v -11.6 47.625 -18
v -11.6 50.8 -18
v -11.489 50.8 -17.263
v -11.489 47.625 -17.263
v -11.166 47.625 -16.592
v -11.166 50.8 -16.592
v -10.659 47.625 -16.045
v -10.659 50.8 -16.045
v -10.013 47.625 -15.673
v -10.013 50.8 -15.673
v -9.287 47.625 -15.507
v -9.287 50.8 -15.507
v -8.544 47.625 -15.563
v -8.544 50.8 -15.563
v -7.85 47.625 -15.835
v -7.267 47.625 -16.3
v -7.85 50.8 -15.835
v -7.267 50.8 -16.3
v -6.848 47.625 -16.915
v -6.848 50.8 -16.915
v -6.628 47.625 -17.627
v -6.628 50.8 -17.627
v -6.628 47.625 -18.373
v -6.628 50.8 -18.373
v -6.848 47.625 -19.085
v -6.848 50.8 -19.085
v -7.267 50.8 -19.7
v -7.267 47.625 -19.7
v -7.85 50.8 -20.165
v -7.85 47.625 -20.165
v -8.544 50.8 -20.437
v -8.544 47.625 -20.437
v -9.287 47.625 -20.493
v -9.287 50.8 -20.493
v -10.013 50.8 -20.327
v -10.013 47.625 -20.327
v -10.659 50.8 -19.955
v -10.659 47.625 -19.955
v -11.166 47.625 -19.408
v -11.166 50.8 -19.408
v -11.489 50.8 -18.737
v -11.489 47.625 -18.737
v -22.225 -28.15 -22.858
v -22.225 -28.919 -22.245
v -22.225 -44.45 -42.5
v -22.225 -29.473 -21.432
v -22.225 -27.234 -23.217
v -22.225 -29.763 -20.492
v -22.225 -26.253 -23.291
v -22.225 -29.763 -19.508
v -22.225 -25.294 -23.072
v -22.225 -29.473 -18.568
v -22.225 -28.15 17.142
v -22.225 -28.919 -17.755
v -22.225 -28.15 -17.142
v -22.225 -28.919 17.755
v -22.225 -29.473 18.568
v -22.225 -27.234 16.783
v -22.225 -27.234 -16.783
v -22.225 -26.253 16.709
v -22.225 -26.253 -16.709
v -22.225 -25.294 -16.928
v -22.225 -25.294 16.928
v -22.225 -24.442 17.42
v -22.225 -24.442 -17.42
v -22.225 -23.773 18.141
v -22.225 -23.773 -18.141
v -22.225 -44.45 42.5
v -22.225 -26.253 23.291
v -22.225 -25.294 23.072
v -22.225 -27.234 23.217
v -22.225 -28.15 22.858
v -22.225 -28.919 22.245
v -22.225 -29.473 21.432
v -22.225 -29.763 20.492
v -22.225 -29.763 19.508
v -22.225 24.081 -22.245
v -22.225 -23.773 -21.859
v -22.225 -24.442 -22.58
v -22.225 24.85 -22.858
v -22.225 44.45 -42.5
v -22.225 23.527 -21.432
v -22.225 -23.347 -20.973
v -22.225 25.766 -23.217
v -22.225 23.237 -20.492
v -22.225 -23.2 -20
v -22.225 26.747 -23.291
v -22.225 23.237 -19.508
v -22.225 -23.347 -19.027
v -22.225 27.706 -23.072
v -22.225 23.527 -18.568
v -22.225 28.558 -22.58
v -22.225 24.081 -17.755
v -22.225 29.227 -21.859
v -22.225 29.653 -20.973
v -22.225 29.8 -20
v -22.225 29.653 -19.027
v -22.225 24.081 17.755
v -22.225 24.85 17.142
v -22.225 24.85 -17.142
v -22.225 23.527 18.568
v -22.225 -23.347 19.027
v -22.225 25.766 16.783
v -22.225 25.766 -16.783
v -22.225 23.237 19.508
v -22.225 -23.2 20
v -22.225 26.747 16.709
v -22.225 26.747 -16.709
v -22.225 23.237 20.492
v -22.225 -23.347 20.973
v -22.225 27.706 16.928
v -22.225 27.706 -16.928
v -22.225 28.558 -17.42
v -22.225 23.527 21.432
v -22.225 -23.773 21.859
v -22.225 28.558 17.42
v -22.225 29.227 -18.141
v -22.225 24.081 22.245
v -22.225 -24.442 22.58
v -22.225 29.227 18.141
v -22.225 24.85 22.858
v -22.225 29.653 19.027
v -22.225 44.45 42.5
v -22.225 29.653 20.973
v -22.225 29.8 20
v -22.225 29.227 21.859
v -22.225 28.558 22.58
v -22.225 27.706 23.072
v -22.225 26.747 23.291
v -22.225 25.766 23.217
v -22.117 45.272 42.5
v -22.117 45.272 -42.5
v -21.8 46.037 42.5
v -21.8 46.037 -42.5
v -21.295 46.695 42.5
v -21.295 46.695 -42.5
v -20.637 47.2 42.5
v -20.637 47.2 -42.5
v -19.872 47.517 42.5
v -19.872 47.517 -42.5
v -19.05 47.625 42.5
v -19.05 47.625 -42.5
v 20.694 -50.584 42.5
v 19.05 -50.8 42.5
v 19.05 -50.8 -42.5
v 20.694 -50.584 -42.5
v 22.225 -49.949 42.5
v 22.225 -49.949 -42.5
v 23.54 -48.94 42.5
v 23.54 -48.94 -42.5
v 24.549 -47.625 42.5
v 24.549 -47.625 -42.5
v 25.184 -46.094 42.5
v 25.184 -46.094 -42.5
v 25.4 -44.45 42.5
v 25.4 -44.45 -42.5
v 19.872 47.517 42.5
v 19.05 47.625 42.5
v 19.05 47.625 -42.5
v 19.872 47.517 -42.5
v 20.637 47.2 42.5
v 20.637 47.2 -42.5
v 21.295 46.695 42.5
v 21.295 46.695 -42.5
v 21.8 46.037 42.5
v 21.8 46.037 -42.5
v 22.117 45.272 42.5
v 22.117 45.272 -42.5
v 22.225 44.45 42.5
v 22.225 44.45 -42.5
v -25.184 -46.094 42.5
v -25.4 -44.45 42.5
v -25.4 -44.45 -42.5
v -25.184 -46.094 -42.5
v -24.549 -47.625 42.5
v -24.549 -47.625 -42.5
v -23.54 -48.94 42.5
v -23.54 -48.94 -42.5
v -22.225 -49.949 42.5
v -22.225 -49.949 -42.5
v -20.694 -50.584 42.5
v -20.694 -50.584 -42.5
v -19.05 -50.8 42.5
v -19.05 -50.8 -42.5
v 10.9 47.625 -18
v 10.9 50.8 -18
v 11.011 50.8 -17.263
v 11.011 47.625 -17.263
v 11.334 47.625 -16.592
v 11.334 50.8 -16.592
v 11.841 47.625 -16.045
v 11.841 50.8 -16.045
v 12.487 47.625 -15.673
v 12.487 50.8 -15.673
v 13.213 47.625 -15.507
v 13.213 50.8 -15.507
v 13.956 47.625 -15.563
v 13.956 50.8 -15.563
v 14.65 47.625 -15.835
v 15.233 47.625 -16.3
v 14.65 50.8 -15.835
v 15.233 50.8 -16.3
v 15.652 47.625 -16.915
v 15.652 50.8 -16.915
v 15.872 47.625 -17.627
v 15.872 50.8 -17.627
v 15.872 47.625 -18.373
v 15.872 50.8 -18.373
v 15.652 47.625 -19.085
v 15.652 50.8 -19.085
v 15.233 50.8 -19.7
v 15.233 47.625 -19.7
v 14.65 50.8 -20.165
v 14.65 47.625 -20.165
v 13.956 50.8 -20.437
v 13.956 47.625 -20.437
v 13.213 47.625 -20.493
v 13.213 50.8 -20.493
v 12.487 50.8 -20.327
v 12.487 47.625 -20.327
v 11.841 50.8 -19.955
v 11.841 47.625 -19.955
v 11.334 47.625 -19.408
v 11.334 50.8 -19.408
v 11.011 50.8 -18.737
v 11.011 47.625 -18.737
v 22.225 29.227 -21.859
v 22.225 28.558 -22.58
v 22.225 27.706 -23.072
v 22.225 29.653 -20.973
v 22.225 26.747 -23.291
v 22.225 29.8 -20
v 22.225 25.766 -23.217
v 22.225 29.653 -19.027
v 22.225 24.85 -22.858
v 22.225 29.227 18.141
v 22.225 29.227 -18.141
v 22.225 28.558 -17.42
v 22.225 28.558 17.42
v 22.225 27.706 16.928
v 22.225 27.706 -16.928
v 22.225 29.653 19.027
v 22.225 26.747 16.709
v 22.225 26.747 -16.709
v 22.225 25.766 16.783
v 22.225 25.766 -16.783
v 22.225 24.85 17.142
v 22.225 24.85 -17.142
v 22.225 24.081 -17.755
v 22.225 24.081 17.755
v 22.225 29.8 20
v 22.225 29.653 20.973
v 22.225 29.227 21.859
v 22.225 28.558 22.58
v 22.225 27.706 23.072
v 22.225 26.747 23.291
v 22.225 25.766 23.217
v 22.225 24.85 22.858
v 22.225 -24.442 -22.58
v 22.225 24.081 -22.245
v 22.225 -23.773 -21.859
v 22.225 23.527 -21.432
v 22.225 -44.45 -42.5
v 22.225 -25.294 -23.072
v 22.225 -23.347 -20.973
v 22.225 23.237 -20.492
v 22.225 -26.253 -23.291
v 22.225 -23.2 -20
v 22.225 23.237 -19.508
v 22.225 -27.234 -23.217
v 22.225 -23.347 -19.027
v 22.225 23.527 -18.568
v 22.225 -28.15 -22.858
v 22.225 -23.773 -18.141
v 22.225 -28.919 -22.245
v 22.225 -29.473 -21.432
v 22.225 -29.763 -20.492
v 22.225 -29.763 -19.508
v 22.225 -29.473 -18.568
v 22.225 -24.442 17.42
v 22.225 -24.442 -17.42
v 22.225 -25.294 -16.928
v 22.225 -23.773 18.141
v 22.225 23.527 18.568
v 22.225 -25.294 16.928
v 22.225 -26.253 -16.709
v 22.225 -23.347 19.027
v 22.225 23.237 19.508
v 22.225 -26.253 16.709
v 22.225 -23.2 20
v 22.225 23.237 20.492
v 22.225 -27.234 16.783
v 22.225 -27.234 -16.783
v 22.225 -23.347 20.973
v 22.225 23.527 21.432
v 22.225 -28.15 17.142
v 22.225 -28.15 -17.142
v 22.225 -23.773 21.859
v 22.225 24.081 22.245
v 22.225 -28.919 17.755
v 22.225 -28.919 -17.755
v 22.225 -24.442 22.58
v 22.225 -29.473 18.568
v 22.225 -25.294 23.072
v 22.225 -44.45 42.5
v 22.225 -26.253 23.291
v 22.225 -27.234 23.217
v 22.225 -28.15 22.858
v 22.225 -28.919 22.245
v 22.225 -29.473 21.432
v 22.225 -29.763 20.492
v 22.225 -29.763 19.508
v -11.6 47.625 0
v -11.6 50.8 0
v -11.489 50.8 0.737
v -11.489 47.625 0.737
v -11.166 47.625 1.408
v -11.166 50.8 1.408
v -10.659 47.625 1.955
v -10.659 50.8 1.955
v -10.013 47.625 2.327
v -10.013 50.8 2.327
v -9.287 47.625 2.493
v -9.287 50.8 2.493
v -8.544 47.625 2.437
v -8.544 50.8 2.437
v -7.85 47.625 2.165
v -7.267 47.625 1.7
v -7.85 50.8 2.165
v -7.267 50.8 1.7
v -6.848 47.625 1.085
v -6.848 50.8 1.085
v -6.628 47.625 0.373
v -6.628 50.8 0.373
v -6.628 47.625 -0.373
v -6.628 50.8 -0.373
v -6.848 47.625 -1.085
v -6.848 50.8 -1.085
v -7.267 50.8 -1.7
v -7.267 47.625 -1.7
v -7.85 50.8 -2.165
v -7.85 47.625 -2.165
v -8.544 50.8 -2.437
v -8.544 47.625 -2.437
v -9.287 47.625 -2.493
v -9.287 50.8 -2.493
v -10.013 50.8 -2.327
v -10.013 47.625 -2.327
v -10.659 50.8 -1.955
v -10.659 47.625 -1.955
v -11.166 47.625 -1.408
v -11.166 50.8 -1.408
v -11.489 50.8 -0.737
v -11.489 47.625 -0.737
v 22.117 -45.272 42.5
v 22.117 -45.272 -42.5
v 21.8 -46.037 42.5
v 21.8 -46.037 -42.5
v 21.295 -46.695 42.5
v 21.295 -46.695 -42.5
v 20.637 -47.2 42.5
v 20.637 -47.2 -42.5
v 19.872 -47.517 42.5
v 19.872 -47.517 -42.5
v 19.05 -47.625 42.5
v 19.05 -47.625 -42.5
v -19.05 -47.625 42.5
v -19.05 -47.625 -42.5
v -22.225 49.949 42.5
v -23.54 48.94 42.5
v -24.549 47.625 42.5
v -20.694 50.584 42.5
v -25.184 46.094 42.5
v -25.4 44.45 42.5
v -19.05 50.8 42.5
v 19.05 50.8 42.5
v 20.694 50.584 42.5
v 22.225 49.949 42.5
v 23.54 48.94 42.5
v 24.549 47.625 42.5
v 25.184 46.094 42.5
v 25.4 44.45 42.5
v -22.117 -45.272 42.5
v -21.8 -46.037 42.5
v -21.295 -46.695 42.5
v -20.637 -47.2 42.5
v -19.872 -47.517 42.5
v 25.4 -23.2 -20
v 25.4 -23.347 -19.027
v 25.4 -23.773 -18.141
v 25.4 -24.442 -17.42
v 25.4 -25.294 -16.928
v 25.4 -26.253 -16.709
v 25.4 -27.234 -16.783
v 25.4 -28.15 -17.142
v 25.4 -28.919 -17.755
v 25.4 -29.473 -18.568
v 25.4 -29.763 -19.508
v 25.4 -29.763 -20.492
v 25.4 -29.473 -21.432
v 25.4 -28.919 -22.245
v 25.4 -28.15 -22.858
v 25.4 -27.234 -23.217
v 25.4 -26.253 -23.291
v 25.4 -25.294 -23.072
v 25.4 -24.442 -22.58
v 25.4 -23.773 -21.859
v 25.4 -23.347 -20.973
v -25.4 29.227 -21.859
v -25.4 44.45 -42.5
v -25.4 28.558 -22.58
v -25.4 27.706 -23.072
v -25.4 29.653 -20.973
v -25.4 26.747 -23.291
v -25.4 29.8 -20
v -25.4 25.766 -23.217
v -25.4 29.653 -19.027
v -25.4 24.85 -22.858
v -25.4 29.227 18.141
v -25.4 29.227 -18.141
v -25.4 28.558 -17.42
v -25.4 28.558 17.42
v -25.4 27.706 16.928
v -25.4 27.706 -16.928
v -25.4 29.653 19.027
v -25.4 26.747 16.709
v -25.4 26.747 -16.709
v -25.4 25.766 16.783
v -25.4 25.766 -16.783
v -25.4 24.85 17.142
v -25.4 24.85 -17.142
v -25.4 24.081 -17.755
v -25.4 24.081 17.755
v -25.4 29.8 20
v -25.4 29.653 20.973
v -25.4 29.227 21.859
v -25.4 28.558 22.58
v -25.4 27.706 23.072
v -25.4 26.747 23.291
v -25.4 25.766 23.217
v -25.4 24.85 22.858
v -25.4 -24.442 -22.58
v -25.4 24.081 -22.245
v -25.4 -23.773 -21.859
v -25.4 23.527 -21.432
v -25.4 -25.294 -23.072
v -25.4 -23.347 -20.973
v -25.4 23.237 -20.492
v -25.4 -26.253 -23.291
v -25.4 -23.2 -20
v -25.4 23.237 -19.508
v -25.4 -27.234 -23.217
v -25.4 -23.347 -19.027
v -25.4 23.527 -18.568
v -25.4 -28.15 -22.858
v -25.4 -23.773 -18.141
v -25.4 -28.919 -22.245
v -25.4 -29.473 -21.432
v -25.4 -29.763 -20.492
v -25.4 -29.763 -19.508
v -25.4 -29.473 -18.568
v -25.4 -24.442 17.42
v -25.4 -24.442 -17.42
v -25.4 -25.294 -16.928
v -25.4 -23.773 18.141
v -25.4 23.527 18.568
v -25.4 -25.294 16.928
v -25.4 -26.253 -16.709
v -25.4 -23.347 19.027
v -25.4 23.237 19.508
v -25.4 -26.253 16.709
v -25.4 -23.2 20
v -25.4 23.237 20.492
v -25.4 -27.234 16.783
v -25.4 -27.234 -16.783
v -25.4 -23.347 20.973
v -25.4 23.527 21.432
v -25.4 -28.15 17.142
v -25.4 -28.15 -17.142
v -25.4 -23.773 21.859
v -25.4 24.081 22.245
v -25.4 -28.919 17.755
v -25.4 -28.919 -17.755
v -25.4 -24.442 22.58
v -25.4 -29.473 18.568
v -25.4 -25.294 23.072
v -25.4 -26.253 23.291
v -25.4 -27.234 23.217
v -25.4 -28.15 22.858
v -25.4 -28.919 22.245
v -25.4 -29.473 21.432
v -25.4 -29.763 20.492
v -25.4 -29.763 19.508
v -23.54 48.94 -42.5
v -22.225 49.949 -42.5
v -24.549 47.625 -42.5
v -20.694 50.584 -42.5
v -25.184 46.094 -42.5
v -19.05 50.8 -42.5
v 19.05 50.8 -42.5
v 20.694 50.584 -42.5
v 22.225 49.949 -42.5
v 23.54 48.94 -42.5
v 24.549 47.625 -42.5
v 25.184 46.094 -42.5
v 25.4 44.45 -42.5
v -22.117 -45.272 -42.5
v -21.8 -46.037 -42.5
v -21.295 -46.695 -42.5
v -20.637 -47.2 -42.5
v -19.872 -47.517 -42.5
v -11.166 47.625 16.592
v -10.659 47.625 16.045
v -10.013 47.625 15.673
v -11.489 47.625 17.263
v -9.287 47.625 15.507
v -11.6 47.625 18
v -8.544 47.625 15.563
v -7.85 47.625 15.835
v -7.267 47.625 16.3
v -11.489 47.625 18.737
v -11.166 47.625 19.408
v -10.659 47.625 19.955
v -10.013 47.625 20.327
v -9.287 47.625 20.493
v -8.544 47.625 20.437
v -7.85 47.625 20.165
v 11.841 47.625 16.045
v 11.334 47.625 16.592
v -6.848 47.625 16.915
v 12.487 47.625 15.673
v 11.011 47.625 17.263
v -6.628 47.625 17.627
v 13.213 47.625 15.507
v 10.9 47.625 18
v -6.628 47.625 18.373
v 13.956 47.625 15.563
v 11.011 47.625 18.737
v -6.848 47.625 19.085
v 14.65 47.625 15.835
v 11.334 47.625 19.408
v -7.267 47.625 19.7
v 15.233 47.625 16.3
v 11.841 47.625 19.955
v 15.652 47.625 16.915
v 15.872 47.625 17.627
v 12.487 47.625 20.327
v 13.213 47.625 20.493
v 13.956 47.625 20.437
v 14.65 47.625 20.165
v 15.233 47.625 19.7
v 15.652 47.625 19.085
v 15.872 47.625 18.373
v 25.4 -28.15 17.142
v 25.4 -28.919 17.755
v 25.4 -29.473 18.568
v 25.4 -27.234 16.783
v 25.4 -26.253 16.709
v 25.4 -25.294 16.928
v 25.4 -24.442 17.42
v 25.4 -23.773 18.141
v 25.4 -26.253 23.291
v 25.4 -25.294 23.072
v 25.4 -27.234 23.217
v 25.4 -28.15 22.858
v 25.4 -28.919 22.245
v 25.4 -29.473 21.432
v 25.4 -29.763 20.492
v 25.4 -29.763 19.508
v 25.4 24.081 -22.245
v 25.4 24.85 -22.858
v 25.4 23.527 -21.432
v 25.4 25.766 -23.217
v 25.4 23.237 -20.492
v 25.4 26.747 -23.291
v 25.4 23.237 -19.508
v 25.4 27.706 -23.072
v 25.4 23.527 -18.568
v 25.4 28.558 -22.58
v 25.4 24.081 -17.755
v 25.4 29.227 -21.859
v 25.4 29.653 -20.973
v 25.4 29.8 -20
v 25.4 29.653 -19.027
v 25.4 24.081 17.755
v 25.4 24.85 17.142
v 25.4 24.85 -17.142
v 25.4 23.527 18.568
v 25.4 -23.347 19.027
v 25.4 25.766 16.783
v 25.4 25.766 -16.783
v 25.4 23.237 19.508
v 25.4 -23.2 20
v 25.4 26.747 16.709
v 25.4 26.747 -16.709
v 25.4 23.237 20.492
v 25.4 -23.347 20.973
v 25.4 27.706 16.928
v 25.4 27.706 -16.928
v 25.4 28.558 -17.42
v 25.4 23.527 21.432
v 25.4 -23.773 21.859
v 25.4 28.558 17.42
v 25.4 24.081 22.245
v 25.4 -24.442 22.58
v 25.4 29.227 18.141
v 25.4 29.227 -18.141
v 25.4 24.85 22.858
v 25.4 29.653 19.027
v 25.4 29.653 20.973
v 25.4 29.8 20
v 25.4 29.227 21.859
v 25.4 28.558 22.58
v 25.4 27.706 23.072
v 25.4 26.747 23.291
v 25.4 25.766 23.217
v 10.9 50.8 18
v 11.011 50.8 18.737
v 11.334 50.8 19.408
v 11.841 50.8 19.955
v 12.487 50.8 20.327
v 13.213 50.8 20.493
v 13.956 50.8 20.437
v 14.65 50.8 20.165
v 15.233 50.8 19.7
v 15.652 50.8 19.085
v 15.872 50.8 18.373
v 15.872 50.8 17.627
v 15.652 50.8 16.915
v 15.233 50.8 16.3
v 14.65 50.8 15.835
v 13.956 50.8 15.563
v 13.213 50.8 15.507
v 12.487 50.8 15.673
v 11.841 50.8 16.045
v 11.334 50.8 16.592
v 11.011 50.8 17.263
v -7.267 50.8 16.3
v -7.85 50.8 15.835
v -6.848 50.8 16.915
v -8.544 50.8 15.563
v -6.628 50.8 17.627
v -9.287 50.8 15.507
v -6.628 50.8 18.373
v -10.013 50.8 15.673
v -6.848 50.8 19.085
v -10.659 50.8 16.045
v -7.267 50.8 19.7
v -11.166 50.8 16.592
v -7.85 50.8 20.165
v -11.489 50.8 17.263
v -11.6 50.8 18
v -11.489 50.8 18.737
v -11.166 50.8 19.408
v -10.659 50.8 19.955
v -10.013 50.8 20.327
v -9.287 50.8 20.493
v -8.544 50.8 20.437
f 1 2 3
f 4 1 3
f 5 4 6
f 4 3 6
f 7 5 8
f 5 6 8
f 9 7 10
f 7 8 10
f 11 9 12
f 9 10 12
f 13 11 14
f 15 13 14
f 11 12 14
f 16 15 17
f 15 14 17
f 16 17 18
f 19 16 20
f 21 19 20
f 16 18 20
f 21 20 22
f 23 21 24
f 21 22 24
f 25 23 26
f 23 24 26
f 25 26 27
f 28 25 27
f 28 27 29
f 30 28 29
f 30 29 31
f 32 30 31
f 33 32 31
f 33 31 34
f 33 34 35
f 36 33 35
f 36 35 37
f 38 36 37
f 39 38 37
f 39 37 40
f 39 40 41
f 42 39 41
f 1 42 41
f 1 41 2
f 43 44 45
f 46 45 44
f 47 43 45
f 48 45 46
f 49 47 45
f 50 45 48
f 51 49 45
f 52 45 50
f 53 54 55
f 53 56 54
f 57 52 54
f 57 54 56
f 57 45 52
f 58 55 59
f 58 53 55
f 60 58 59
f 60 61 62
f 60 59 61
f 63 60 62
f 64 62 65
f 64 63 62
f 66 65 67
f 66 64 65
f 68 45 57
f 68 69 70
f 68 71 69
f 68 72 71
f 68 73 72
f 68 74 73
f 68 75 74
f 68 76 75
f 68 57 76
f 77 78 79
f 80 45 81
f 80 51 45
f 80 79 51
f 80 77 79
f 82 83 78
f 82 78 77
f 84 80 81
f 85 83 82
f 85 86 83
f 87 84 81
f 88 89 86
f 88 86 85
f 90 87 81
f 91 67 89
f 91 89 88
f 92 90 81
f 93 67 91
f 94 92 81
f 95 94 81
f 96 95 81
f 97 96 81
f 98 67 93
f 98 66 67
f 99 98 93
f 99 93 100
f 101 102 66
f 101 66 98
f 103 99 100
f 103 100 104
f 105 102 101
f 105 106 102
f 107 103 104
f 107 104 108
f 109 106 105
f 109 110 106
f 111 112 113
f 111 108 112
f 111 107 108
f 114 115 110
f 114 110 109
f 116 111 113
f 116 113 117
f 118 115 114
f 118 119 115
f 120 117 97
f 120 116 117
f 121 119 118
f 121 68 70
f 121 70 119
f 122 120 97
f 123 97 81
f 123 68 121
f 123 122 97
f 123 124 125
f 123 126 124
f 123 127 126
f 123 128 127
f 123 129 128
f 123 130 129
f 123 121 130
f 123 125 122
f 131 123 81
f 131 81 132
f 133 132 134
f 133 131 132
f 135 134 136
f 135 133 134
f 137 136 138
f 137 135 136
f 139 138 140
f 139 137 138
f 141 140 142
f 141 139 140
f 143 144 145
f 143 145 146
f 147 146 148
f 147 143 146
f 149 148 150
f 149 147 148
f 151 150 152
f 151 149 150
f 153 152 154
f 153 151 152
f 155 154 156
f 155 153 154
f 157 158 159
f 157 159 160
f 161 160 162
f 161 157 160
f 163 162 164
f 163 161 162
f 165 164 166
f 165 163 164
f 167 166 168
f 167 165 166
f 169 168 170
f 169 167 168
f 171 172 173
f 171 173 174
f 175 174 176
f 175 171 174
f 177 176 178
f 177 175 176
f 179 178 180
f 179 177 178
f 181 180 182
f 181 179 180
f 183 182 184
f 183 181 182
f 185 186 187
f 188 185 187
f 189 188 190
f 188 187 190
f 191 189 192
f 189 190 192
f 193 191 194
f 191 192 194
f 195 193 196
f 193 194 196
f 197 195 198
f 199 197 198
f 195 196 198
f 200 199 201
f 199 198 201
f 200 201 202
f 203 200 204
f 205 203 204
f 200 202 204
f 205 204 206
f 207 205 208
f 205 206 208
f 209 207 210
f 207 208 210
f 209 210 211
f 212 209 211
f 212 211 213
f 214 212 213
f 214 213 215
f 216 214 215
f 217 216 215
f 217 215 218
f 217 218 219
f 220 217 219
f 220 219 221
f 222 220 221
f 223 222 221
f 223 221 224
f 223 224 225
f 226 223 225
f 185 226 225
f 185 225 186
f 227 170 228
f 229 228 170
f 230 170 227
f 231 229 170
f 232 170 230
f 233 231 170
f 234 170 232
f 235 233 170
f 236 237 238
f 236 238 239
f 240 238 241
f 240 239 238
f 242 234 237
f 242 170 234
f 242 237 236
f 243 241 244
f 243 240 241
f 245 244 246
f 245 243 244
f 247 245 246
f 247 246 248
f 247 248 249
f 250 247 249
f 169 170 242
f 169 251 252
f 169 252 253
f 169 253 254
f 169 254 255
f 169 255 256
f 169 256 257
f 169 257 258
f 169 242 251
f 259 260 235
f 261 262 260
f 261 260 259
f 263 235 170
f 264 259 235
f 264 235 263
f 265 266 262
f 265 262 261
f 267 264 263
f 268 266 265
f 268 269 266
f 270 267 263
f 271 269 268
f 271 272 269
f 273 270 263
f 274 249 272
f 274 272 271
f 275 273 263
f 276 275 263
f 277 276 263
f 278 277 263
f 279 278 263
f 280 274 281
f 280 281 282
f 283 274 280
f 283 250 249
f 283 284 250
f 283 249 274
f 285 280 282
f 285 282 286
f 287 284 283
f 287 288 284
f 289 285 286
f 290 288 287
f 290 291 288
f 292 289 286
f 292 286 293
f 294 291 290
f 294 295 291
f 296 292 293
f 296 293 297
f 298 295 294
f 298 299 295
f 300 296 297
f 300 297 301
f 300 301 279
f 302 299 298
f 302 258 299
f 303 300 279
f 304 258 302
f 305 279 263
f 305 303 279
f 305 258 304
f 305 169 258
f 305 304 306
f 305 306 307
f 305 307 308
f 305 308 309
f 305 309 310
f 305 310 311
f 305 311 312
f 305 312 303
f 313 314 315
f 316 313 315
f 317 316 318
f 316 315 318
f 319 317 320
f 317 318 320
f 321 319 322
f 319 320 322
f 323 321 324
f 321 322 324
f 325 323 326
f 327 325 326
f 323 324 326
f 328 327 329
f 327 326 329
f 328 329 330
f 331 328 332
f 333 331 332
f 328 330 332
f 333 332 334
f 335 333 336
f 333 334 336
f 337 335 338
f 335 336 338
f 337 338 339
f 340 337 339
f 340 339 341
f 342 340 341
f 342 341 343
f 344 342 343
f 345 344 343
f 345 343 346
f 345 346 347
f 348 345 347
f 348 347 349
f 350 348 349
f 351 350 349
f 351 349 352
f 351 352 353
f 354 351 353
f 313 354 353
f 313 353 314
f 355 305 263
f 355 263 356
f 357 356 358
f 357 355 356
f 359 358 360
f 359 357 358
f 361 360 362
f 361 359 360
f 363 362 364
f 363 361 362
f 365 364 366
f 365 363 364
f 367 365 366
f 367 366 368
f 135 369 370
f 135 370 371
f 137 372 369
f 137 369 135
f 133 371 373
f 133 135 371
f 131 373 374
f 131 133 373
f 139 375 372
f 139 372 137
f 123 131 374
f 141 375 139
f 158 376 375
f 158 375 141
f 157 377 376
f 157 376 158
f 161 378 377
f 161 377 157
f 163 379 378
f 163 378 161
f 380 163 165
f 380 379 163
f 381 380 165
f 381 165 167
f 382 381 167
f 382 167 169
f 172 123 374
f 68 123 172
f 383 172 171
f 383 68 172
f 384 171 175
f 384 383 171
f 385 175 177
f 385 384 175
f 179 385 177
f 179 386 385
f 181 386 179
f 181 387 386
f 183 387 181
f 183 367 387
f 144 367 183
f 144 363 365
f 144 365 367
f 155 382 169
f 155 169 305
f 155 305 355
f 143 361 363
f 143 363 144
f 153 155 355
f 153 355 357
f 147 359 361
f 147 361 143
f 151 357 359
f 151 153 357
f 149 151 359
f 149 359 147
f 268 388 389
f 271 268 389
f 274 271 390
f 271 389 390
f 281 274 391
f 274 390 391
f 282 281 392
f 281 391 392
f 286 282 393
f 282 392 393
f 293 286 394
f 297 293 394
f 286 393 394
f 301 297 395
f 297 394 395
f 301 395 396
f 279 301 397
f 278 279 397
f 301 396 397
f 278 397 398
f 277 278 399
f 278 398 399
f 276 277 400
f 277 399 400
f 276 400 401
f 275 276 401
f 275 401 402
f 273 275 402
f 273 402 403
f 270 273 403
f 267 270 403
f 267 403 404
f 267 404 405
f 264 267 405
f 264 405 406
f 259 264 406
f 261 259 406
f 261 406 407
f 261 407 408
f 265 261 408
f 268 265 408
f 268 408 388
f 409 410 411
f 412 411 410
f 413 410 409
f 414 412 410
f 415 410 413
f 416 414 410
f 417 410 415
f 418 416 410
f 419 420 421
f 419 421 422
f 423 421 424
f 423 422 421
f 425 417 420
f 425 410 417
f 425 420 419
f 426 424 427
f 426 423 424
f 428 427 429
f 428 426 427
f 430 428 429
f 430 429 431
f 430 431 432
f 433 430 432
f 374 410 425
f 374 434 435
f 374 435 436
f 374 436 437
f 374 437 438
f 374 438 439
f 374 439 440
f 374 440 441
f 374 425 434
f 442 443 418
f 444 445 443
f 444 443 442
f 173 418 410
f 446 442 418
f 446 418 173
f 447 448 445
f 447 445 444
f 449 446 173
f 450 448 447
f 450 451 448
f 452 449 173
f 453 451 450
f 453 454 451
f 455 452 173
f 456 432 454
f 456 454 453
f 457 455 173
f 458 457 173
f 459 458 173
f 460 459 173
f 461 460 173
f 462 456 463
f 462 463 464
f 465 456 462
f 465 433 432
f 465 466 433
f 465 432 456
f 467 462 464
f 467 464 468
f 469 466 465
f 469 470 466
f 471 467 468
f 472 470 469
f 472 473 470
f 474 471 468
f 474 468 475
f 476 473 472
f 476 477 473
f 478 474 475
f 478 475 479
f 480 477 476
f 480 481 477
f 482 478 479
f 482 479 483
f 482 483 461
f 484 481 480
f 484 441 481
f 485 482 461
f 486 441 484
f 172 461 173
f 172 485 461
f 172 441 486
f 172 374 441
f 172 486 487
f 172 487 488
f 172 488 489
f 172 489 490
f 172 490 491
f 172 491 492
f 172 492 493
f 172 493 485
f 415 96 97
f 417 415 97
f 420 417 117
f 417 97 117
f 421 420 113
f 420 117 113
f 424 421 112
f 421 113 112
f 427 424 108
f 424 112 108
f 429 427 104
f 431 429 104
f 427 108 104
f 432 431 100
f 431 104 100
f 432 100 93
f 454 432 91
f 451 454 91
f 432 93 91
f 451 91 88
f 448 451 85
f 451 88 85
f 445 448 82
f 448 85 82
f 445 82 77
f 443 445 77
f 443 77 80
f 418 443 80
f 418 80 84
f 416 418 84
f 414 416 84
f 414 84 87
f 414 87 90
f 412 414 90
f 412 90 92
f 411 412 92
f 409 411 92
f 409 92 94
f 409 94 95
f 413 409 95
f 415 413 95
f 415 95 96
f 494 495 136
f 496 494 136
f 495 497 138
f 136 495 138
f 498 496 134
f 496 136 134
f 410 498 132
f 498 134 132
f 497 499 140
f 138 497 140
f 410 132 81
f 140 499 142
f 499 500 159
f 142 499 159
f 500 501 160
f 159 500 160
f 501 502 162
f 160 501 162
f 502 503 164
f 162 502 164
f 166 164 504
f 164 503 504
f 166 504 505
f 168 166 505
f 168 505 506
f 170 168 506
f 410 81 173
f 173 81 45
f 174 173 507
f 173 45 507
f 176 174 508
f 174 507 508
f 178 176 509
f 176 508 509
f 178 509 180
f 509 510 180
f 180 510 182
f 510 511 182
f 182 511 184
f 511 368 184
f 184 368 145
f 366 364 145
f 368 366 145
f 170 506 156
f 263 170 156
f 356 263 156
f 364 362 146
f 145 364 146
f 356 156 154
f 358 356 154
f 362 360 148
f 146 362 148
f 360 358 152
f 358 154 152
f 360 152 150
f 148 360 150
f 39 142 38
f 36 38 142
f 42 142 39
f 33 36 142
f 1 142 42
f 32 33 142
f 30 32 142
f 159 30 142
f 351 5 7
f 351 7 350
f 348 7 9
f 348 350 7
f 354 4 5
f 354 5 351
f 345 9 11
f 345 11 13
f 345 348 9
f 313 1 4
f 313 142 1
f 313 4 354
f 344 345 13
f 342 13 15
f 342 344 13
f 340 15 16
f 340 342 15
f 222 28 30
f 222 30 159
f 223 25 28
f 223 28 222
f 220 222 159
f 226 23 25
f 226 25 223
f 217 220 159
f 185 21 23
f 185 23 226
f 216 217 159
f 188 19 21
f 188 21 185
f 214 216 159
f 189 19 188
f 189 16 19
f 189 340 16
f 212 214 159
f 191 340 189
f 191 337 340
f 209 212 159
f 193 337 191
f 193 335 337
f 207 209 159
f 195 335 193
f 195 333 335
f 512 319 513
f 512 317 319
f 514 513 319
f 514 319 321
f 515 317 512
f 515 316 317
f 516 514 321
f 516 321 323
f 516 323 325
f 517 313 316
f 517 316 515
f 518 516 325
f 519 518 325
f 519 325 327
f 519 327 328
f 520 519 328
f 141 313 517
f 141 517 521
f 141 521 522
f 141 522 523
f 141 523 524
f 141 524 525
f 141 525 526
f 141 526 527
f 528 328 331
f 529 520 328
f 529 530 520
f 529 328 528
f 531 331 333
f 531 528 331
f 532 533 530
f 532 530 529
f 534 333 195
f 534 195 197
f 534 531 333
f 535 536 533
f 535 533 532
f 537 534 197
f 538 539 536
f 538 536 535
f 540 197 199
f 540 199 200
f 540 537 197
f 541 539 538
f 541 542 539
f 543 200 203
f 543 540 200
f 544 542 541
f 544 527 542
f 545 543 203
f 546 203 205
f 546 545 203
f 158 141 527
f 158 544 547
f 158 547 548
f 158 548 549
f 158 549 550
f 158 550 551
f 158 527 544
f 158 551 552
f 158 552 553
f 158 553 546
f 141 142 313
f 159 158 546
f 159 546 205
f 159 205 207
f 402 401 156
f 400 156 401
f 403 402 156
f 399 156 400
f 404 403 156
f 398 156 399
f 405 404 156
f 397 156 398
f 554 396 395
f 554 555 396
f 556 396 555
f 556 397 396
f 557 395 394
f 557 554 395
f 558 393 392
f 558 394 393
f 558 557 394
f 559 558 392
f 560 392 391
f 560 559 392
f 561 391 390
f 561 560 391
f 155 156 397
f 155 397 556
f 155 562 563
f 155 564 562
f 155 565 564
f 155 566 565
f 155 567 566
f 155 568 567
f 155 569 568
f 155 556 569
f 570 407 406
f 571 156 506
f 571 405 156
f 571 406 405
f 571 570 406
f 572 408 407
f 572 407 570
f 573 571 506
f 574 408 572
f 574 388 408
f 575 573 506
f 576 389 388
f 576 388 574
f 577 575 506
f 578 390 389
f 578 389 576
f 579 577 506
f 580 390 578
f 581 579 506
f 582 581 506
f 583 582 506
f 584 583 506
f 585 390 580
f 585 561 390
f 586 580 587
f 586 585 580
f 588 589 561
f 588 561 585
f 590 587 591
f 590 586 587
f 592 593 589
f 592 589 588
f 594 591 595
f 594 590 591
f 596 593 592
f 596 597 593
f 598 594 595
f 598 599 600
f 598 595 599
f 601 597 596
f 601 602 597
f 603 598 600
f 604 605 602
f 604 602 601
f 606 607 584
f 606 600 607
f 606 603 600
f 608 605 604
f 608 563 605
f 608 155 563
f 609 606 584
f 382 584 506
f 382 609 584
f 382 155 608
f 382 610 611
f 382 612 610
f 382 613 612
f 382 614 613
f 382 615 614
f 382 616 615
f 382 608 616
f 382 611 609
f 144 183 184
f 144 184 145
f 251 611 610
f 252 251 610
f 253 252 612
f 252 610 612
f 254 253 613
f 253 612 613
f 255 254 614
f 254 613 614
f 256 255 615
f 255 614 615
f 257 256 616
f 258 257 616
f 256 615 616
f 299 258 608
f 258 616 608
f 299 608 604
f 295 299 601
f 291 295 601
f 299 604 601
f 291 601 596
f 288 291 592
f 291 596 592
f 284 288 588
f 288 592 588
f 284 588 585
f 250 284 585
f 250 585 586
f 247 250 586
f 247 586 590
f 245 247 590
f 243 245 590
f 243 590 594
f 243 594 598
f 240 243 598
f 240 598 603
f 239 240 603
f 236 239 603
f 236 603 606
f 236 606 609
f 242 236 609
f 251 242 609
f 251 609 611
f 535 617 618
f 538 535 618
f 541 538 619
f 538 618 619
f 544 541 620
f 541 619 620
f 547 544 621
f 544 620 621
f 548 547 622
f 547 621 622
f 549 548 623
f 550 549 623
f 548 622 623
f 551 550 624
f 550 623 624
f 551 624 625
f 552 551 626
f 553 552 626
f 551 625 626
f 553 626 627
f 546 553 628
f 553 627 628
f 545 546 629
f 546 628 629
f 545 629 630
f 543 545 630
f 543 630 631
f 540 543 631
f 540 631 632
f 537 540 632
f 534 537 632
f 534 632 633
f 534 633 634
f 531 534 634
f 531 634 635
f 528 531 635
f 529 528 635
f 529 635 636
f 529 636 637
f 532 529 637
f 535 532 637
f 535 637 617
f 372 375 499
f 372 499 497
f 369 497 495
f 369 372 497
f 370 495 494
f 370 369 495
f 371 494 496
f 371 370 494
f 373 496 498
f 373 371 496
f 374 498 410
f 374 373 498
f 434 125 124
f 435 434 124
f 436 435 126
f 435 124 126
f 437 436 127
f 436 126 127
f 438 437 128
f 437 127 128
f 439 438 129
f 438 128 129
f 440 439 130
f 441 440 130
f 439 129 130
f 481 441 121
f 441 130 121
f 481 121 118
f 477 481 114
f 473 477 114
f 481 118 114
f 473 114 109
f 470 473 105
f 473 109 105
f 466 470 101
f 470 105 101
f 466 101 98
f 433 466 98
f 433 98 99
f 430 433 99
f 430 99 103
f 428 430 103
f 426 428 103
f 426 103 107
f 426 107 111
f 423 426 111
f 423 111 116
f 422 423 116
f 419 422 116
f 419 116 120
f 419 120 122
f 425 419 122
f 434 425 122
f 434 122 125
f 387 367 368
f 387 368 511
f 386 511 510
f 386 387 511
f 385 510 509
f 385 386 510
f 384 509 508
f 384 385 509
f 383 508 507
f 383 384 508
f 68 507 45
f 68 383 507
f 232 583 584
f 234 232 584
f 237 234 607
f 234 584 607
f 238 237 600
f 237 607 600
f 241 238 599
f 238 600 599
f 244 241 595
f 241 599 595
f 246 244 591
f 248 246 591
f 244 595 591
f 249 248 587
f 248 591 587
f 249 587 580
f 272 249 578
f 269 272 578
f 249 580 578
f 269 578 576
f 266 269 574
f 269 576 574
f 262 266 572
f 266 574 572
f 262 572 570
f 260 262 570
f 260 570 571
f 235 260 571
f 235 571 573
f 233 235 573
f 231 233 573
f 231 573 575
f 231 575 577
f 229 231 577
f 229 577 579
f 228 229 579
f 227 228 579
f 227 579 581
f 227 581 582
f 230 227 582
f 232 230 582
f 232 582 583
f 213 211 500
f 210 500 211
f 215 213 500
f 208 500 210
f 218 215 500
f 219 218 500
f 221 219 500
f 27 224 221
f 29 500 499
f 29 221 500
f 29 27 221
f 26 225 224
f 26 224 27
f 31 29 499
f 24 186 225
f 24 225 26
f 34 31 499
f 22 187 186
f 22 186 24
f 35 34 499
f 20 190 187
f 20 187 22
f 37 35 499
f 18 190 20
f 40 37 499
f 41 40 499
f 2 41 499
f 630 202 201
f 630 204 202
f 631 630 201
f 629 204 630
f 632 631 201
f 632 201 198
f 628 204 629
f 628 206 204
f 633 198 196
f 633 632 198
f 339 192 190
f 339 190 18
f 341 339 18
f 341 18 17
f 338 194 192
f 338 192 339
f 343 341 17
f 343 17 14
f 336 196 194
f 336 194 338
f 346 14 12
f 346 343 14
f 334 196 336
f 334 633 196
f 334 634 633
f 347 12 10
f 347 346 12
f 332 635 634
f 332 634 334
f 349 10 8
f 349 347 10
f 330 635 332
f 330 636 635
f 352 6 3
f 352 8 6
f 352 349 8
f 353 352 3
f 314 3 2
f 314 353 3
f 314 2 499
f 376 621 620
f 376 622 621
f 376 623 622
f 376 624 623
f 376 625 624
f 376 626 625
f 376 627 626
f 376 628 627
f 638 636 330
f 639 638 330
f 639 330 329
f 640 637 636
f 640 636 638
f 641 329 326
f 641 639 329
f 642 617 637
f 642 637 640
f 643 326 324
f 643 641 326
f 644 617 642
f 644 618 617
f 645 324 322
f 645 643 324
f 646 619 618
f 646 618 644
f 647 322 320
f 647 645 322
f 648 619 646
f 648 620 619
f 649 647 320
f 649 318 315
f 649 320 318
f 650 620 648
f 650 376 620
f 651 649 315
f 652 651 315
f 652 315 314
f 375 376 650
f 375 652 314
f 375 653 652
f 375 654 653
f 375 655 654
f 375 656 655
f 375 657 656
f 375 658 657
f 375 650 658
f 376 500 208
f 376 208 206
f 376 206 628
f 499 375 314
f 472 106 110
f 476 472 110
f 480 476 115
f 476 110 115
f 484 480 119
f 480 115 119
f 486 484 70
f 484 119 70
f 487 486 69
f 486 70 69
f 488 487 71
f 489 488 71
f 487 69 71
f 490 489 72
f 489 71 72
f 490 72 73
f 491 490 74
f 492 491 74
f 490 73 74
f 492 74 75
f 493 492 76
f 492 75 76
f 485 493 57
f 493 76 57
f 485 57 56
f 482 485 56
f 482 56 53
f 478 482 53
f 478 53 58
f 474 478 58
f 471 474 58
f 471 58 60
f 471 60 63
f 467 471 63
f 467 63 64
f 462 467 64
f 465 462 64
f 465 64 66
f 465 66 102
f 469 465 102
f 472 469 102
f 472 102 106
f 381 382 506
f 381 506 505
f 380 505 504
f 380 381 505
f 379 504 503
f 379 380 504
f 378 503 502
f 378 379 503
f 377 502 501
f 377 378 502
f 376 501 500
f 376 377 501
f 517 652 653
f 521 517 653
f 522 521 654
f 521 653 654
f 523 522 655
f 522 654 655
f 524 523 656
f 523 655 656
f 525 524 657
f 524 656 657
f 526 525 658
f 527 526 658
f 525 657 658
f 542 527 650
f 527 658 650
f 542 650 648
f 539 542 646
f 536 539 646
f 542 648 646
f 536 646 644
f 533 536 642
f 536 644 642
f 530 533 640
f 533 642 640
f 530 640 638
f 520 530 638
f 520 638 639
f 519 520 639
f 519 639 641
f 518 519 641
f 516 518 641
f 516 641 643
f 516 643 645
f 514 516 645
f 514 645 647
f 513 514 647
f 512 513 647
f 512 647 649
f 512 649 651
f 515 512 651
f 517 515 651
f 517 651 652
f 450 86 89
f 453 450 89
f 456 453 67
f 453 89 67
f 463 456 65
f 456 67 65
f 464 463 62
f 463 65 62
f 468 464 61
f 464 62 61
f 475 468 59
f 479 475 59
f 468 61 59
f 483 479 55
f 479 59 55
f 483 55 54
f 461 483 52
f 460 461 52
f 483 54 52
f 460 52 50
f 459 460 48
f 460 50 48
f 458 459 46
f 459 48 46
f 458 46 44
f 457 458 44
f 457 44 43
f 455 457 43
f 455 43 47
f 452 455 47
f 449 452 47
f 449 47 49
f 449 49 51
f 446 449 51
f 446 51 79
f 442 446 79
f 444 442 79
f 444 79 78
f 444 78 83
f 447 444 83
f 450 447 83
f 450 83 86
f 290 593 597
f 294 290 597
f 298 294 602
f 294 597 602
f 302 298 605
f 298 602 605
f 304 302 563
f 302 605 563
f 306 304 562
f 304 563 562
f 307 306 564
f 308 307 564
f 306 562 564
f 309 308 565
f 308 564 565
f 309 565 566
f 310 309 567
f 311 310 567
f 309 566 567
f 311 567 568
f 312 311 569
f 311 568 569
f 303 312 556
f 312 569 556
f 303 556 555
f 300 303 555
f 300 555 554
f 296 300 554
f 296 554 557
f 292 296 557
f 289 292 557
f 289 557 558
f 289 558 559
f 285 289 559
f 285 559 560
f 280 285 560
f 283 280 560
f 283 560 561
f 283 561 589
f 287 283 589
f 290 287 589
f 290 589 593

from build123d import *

# Parameters (mm, degrees)
CNC_4X2X0_125_1_DEPTH = 85
SKETCH3_R             = 2.5
CUT_EXTRUDE1_DEPTH    = 10
SKETCH2_R             = 3.3
CUT_EXTRUDE2_DEPTH    = 84.471731742


with BuildPart() as part:
    # Sketch1 → Cnc 4X2X0.125(1) (new body)
    with BuildSketch(Plane.YX.offset(-42.5)):
        with BuildLine():
            Line((44.45, -25.4), (-44.45, -25.4))
            ThreePointArc((-44.45, -25.4), (-48.940128061, -23.540128061), (-50.8, -19.05))
            Line((-50.8, -19.05), (-50.8, 19.05))
            ThreePointArc((-50.8, 19.05), (-48.940128061, 23.540128061), (-44.45, 25.4))
            Line((-44.45, 25.4), (44.45, 25.4))
            ThreePointArc((44.45, 25.4), (48.940128061, 23.540128061), (50.8, 19.05))
            Line((50.8, 19.05), (50.8, -19.05))
            ThreePointArc((50.8, -19.05), (48.940128061, -23.540128061), (44.45, -25.4))
        make_face()
        with BuildLine():
            Line((44.45, 22.225), (-44.45, 22.225))
            ThreePointArc((-44.45, 22.225), (-46.69506403, 21.29506403), (-47.625, 19.05))
            Line((-47.625, 19.05), (-47.625, -19.05))
            ThreePointArc((-47.625, -19.05), (-46.69506403, -21.29506403), (-44.45, -22.225))
            Line((-44.45, -22.225), (44.45, -22.225))
            ThreePointArc((44.45, -22.225), (46.69506403, -21.29506403), (47.625, -19.05))
            Line((47.625, -19.05), (47.625, 19.05))
            ThreePointArc((47.625, 19.05), (46.69506403, 21.29506403), (44.45, 22.225))
        make_face(mode=Mode.SUBTRACT)
    extrude(amount=CNC_4X2X0_125_1_DEPTH)

    # Sketch3 → Cut-Extrude1 (cut)
    with BuildSketch(Plane(origin=(0, 50.8, 0), x_dir=(1, 0, 0), z_dir=(0, 1, 0))):
        with Locations(Location((-9.1, 18, 0), (0, 0, 180))):
            Circle(SKETCH3_R)
        with Locations(Location((-9.1, 0, 0), (0, 0, 180))):
            Circle(SKETCH3_R)
        with Locations(Location((-9.1, -18, 0), (0, 0, 180))):
            Circle(SKETCH3_R)
        with Locations(Location((13.4, 18, 0), (0, 0, 180))):
            Circle(SKETCH3_R)
        with Locations(Location((13.4, -18, 0), (0, 0, 180))):
            Circle(SKETCH3_R)
    extrude(amount=-CUT_EXTRUDE1_DEPTH, mode=Mode.SUBTRACT)

    # Sketch2 → Cut-Extrude2 (cut, through all)
    with BuildSketch(Plane(origin=(25.4, 0, 0), x_dir=(0, 0, -1), z_dir=(1, 0, 0))):
        with Locations(Location((-20, 26.5, 0), (0, 0, 90))):
            Circle(SKETCH2_R)
        with Locations(Location((20, 26.5, 0), (0, 0, 90))):
            Circle(SKETCH2_R)
        with Locations(Location((20, -26.5, 0), (0, 0, 90))):
            Circle(SKETCH2_R)
        with Locations(Location((-20, -26.5, 0), (0, 0, 90))):
            Circle(SKETCH2_R)
    extrude(amount=-CUT_EXTRUDE2_DEPTH, mode=Mode.SUBTRACT)


solid = part.part
